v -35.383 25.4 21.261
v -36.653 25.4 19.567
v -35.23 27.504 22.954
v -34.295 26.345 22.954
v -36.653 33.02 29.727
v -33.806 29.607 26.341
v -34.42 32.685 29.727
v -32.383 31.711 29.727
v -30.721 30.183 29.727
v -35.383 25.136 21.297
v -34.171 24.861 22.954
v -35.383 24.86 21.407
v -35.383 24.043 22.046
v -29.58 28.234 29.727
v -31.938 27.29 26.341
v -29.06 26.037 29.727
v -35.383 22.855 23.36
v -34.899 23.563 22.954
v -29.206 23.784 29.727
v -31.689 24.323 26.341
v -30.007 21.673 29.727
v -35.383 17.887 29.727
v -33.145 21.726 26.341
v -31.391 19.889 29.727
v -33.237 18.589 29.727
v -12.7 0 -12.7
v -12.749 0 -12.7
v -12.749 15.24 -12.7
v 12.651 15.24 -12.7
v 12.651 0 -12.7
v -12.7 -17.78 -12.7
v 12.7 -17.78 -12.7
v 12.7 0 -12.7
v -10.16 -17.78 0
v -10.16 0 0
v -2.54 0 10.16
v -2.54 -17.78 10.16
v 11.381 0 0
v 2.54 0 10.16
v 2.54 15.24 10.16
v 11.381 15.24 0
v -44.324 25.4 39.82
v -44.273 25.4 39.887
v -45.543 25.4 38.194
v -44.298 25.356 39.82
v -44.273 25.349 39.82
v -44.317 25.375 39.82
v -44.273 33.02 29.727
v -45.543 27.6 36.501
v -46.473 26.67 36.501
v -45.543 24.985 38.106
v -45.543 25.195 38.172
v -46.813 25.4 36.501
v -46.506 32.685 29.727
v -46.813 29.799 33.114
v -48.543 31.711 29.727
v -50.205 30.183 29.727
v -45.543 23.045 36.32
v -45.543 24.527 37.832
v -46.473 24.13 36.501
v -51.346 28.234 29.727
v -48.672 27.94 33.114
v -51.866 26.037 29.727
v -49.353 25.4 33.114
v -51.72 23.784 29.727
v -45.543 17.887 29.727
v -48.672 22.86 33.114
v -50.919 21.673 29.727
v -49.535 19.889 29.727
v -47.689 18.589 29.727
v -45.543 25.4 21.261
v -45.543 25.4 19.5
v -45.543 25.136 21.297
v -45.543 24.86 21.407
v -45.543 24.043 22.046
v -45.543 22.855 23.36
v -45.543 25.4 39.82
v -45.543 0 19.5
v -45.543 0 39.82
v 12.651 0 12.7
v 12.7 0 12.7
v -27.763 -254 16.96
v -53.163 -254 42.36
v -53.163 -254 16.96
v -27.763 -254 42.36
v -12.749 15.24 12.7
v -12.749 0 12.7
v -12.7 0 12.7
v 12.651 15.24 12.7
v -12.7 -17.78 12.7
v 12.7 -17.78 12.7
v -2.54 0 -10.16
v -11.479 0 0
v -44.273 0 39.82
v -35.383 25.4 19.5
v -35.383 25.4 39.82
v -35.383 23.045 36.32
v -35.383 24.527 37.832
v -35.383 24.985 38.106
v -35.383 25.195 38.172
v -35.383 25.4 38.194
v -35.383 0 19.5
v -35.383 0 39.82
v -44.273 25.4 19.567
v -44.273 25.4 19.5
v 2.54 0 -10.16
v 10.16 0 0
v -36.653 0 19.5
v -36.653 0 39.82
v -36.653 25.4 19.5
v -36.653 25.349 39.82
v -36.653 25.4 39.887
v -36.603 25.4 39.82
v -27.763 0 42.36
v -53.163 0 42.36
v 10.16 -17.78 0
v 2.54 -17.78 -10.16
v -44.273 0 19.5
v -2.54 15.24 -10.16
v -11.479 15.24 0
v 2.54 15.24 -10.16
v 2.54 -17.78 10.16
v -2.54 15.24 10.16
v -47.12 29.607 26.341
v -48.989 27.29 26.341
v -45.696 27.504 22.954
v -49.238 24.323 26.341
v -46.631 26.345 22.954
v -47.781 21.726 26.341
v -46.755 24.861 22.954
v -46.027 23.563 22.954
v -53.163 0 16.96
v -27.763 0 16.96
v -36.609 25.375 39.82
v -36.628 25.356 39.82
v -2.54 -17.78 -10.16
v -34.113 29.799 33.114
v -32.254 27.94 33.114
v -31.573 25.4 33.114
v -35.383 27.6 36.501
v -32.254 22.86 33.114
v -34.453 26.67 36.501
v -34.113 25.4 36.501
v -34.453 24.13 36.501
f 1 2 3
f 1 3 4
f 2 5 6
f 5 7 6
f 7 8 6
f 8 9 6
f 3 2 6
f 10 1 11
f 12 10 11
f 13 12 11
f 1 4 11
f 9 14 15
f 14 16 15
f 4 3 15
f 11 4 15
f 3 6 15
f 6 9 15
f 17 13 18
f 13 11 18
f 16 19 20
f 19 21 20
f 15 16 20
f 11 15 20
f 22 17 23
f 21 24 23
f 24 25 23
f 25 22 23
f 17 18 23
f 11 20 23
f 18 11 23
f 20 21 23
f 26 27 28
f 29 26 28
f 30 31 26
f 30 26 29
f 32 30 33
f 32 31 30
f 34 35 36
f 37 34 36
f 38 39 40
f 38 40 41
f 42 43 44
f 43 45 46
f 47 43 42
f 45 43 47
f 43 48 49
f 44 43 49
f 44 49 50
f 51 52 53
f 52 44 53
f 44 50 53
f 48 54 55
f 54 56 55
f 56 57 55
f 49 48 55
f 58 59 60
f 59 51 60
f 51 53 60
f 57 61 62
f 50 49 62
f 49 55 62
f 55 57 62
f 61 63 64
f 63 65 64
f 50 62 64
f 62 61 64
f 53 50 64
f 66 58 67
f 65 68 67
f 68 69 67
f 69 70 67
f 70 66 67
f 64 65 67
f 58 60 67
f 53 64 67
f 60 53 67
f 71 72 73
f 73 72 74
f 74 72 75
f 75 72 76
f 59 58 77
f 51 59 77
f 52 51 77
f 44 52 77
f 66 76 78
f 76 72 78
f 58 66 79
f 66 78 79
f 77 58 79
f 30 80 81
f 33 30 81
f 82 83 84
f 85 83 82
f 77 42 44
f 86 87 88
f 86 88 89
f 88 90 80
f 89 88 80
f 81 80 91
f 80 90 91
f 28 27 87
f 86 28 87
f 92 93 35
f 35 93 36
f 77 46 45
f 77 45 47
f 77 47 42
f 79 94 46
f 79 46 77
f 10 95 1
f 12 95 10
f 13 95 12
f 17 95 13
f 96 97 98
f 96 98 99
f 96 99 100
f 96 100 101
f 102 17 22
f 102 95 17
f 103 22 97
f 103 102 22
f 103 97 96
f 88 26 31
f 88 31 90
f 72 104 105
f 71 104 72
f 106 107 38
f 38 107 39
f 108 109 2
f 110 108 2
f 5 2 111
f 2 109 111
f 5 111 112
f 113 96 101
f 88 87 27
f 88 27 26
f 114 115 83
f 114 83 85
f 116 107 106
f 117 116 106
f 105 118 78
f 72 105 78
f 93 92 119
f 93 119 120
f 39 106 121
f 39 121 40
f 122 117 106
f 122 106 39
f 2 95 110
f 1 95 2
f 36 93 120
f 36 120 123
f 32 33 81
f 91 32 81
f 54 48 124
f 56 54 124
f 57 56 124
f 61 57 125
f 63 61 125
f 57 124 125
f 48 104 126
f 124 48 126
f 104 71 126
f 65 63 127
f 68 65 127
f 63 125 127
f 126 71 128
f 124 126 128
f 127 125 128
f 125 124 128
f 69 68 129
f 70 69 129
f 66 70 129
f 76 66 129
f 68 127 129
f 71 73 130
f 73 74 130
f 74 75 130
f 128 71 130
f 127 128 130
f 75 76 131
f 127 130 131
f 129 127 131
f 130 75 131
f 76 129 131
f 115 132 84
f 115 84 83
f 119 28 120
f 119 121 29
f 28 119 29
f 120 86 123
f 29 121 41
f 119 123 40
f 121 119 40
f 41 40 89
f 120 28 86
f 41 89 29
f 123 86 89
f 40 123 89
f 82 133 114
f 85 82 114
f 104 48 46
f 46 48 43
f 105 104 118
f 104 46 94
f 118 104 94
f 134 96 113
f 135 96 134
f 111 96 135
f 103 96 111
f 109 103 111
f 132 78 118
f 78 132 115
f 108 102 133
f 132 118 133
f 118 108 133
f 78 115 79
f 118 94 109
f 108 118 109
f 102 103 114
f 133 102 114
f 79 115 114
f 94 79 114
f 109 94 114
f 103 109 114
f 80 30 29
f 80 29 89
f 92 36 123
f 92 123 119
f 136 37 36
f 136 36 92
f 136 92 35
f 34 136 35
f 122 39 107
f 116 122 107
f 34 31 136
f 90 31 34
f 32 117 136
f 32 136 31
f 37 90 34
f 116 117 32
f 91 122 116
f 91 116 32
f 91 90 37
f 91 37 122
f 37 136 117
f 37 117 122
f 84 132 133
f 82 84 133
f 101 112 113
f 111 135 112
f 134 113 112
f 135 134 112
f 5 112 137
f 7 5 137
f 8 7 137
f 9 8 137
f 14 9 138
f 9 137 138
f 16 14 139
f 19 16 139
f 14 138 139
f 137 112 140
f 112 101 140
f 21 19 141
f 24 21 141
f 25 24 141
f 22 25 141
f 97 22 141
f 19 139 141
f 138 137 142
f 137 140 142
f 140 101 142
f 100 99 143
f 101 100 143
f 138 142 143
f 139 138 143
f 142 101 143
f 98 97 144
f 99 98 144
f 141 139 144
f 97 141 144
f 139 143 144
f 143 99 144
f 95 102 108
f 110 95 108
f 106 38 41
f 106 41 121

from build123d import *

# Parameters (mm, degrees)
F0_W          = 25.4
F0_H          = 25.4
F1_DEPTH      = 254
F4_W          = 1.27
F4_H          = 20.32
F5_DEPTH      = 25.4
F6_ANGLE_BACK = 90
F6_ANGLE      = 180
F7_ANGLE_BACK = 90
F7_ANGLE      = 180
F8_W          = 25.4
F8_H          = 25.4
F9_DEPTH      = 17.78
F10_W         = 25.4
F10_H         = 25.4
F11_DEPTH     = 15.24


with BuildPart() as f1:
    # F0 (on Front) → F1 (new body)
    with BuildSketch(Plane.XZ):
        with Locations((-40.4630722478, 29.6600502176)):
            Rectangle(F0_W, F0_H)
    extrude(amount=F1_DEPTH)

    # F4 (on face) → F5 (join)
    with BuildSketch(Plane(origin=(0, 0, 0), x_dir=(-1, 0, 0), z_dir=(0, 1, 0))):
        with Locations((36.0180722478, 29.6600502176)):
            Rectangle(F4_W, F4_H)
        with Locations((44.9080722478, 29.6600502176)):
            Rectangle(F4_W, F4_H)
    extrude(amount=F5_DEPTH)

    # F3 (on offset) → F6 (revolve)
    with BuildSketch(Plane.XZ.offset(-25.4), mode=Mode.PRIVATE) as f6_sk:
        Polygon((-51.8930722478, 29.7274123877), (-44.2730722478, 19.5674123877), (-44.2730722478, 39.8874123877), align=None)
    revolve(f6_sk.sketch.rotate(Axis((-44.2730722478, 25.4, 29.7274123877), (0, 0, 1)), -F6_ANGLE_BACK), axis=Axis((-44.2730722478, 25.4, 29.7274123877), (0, 0, 1)), revolution_arc=F6_ANGLE)

    # F3 (on offset) → F7 (revolve)
    with BuildSketch(Plane.XZ.offset(-25.4), mode=Mode.PRIVATE) as f7_sk:
        Polygon((-36.6530722478, 19.5674123877), (-29.0330722478, 29.7274123877), (-36.6530722478, 39.8874123877), align=None)
    revolve(f7_sk.sketch.rotate(Axis((-36.6530722478, 25.4, 29.7274123877), (0, 0, -1)), -F7_ANGLE_BACK), axis=Axis((-36.6530722478, 25.4, 29.7274123877), (0, 0, -1)), revolution_arc=F7_ANGLE)


with BuildPart() as f9:
    # F8 (on Front) → F9 (new body)
    with BuildSketch(Plane.XZ):
        Rectangle(F8_W, F8_H)
        Polygon((-2.54, 10.16), (-2.54, -10.16), (-10.16, 0), align=None, mode=Mode.SUBTRACT)
        Polygon((2.54, 10.16), (10.16, 0), (2.54, -10.16), align=None, mode=Mode.SUBTRACT)
    extrude(amount=F9_DEPTH)

    # F10 (on Front) → F11 (join)
    with BuildSketch(Plane.XZ):
        with Locations((-0.0493521808, 0)):
            Rectangle(F10_W, F10_H)
        Polygon((-2.54, 10.16), (-2.54, -10.16), (-11.4793521808, 0), align=None, mode=Mode.SUBTRACT)
        Polygon((2.54, 10.16), (11.3806478192, 0), (2.54, -10.16), align=None, mode=Mode.SUBTRACT)
    extrude(amount=-F11_DEPTH)


solid = Compound([f1.part, f9.part])
